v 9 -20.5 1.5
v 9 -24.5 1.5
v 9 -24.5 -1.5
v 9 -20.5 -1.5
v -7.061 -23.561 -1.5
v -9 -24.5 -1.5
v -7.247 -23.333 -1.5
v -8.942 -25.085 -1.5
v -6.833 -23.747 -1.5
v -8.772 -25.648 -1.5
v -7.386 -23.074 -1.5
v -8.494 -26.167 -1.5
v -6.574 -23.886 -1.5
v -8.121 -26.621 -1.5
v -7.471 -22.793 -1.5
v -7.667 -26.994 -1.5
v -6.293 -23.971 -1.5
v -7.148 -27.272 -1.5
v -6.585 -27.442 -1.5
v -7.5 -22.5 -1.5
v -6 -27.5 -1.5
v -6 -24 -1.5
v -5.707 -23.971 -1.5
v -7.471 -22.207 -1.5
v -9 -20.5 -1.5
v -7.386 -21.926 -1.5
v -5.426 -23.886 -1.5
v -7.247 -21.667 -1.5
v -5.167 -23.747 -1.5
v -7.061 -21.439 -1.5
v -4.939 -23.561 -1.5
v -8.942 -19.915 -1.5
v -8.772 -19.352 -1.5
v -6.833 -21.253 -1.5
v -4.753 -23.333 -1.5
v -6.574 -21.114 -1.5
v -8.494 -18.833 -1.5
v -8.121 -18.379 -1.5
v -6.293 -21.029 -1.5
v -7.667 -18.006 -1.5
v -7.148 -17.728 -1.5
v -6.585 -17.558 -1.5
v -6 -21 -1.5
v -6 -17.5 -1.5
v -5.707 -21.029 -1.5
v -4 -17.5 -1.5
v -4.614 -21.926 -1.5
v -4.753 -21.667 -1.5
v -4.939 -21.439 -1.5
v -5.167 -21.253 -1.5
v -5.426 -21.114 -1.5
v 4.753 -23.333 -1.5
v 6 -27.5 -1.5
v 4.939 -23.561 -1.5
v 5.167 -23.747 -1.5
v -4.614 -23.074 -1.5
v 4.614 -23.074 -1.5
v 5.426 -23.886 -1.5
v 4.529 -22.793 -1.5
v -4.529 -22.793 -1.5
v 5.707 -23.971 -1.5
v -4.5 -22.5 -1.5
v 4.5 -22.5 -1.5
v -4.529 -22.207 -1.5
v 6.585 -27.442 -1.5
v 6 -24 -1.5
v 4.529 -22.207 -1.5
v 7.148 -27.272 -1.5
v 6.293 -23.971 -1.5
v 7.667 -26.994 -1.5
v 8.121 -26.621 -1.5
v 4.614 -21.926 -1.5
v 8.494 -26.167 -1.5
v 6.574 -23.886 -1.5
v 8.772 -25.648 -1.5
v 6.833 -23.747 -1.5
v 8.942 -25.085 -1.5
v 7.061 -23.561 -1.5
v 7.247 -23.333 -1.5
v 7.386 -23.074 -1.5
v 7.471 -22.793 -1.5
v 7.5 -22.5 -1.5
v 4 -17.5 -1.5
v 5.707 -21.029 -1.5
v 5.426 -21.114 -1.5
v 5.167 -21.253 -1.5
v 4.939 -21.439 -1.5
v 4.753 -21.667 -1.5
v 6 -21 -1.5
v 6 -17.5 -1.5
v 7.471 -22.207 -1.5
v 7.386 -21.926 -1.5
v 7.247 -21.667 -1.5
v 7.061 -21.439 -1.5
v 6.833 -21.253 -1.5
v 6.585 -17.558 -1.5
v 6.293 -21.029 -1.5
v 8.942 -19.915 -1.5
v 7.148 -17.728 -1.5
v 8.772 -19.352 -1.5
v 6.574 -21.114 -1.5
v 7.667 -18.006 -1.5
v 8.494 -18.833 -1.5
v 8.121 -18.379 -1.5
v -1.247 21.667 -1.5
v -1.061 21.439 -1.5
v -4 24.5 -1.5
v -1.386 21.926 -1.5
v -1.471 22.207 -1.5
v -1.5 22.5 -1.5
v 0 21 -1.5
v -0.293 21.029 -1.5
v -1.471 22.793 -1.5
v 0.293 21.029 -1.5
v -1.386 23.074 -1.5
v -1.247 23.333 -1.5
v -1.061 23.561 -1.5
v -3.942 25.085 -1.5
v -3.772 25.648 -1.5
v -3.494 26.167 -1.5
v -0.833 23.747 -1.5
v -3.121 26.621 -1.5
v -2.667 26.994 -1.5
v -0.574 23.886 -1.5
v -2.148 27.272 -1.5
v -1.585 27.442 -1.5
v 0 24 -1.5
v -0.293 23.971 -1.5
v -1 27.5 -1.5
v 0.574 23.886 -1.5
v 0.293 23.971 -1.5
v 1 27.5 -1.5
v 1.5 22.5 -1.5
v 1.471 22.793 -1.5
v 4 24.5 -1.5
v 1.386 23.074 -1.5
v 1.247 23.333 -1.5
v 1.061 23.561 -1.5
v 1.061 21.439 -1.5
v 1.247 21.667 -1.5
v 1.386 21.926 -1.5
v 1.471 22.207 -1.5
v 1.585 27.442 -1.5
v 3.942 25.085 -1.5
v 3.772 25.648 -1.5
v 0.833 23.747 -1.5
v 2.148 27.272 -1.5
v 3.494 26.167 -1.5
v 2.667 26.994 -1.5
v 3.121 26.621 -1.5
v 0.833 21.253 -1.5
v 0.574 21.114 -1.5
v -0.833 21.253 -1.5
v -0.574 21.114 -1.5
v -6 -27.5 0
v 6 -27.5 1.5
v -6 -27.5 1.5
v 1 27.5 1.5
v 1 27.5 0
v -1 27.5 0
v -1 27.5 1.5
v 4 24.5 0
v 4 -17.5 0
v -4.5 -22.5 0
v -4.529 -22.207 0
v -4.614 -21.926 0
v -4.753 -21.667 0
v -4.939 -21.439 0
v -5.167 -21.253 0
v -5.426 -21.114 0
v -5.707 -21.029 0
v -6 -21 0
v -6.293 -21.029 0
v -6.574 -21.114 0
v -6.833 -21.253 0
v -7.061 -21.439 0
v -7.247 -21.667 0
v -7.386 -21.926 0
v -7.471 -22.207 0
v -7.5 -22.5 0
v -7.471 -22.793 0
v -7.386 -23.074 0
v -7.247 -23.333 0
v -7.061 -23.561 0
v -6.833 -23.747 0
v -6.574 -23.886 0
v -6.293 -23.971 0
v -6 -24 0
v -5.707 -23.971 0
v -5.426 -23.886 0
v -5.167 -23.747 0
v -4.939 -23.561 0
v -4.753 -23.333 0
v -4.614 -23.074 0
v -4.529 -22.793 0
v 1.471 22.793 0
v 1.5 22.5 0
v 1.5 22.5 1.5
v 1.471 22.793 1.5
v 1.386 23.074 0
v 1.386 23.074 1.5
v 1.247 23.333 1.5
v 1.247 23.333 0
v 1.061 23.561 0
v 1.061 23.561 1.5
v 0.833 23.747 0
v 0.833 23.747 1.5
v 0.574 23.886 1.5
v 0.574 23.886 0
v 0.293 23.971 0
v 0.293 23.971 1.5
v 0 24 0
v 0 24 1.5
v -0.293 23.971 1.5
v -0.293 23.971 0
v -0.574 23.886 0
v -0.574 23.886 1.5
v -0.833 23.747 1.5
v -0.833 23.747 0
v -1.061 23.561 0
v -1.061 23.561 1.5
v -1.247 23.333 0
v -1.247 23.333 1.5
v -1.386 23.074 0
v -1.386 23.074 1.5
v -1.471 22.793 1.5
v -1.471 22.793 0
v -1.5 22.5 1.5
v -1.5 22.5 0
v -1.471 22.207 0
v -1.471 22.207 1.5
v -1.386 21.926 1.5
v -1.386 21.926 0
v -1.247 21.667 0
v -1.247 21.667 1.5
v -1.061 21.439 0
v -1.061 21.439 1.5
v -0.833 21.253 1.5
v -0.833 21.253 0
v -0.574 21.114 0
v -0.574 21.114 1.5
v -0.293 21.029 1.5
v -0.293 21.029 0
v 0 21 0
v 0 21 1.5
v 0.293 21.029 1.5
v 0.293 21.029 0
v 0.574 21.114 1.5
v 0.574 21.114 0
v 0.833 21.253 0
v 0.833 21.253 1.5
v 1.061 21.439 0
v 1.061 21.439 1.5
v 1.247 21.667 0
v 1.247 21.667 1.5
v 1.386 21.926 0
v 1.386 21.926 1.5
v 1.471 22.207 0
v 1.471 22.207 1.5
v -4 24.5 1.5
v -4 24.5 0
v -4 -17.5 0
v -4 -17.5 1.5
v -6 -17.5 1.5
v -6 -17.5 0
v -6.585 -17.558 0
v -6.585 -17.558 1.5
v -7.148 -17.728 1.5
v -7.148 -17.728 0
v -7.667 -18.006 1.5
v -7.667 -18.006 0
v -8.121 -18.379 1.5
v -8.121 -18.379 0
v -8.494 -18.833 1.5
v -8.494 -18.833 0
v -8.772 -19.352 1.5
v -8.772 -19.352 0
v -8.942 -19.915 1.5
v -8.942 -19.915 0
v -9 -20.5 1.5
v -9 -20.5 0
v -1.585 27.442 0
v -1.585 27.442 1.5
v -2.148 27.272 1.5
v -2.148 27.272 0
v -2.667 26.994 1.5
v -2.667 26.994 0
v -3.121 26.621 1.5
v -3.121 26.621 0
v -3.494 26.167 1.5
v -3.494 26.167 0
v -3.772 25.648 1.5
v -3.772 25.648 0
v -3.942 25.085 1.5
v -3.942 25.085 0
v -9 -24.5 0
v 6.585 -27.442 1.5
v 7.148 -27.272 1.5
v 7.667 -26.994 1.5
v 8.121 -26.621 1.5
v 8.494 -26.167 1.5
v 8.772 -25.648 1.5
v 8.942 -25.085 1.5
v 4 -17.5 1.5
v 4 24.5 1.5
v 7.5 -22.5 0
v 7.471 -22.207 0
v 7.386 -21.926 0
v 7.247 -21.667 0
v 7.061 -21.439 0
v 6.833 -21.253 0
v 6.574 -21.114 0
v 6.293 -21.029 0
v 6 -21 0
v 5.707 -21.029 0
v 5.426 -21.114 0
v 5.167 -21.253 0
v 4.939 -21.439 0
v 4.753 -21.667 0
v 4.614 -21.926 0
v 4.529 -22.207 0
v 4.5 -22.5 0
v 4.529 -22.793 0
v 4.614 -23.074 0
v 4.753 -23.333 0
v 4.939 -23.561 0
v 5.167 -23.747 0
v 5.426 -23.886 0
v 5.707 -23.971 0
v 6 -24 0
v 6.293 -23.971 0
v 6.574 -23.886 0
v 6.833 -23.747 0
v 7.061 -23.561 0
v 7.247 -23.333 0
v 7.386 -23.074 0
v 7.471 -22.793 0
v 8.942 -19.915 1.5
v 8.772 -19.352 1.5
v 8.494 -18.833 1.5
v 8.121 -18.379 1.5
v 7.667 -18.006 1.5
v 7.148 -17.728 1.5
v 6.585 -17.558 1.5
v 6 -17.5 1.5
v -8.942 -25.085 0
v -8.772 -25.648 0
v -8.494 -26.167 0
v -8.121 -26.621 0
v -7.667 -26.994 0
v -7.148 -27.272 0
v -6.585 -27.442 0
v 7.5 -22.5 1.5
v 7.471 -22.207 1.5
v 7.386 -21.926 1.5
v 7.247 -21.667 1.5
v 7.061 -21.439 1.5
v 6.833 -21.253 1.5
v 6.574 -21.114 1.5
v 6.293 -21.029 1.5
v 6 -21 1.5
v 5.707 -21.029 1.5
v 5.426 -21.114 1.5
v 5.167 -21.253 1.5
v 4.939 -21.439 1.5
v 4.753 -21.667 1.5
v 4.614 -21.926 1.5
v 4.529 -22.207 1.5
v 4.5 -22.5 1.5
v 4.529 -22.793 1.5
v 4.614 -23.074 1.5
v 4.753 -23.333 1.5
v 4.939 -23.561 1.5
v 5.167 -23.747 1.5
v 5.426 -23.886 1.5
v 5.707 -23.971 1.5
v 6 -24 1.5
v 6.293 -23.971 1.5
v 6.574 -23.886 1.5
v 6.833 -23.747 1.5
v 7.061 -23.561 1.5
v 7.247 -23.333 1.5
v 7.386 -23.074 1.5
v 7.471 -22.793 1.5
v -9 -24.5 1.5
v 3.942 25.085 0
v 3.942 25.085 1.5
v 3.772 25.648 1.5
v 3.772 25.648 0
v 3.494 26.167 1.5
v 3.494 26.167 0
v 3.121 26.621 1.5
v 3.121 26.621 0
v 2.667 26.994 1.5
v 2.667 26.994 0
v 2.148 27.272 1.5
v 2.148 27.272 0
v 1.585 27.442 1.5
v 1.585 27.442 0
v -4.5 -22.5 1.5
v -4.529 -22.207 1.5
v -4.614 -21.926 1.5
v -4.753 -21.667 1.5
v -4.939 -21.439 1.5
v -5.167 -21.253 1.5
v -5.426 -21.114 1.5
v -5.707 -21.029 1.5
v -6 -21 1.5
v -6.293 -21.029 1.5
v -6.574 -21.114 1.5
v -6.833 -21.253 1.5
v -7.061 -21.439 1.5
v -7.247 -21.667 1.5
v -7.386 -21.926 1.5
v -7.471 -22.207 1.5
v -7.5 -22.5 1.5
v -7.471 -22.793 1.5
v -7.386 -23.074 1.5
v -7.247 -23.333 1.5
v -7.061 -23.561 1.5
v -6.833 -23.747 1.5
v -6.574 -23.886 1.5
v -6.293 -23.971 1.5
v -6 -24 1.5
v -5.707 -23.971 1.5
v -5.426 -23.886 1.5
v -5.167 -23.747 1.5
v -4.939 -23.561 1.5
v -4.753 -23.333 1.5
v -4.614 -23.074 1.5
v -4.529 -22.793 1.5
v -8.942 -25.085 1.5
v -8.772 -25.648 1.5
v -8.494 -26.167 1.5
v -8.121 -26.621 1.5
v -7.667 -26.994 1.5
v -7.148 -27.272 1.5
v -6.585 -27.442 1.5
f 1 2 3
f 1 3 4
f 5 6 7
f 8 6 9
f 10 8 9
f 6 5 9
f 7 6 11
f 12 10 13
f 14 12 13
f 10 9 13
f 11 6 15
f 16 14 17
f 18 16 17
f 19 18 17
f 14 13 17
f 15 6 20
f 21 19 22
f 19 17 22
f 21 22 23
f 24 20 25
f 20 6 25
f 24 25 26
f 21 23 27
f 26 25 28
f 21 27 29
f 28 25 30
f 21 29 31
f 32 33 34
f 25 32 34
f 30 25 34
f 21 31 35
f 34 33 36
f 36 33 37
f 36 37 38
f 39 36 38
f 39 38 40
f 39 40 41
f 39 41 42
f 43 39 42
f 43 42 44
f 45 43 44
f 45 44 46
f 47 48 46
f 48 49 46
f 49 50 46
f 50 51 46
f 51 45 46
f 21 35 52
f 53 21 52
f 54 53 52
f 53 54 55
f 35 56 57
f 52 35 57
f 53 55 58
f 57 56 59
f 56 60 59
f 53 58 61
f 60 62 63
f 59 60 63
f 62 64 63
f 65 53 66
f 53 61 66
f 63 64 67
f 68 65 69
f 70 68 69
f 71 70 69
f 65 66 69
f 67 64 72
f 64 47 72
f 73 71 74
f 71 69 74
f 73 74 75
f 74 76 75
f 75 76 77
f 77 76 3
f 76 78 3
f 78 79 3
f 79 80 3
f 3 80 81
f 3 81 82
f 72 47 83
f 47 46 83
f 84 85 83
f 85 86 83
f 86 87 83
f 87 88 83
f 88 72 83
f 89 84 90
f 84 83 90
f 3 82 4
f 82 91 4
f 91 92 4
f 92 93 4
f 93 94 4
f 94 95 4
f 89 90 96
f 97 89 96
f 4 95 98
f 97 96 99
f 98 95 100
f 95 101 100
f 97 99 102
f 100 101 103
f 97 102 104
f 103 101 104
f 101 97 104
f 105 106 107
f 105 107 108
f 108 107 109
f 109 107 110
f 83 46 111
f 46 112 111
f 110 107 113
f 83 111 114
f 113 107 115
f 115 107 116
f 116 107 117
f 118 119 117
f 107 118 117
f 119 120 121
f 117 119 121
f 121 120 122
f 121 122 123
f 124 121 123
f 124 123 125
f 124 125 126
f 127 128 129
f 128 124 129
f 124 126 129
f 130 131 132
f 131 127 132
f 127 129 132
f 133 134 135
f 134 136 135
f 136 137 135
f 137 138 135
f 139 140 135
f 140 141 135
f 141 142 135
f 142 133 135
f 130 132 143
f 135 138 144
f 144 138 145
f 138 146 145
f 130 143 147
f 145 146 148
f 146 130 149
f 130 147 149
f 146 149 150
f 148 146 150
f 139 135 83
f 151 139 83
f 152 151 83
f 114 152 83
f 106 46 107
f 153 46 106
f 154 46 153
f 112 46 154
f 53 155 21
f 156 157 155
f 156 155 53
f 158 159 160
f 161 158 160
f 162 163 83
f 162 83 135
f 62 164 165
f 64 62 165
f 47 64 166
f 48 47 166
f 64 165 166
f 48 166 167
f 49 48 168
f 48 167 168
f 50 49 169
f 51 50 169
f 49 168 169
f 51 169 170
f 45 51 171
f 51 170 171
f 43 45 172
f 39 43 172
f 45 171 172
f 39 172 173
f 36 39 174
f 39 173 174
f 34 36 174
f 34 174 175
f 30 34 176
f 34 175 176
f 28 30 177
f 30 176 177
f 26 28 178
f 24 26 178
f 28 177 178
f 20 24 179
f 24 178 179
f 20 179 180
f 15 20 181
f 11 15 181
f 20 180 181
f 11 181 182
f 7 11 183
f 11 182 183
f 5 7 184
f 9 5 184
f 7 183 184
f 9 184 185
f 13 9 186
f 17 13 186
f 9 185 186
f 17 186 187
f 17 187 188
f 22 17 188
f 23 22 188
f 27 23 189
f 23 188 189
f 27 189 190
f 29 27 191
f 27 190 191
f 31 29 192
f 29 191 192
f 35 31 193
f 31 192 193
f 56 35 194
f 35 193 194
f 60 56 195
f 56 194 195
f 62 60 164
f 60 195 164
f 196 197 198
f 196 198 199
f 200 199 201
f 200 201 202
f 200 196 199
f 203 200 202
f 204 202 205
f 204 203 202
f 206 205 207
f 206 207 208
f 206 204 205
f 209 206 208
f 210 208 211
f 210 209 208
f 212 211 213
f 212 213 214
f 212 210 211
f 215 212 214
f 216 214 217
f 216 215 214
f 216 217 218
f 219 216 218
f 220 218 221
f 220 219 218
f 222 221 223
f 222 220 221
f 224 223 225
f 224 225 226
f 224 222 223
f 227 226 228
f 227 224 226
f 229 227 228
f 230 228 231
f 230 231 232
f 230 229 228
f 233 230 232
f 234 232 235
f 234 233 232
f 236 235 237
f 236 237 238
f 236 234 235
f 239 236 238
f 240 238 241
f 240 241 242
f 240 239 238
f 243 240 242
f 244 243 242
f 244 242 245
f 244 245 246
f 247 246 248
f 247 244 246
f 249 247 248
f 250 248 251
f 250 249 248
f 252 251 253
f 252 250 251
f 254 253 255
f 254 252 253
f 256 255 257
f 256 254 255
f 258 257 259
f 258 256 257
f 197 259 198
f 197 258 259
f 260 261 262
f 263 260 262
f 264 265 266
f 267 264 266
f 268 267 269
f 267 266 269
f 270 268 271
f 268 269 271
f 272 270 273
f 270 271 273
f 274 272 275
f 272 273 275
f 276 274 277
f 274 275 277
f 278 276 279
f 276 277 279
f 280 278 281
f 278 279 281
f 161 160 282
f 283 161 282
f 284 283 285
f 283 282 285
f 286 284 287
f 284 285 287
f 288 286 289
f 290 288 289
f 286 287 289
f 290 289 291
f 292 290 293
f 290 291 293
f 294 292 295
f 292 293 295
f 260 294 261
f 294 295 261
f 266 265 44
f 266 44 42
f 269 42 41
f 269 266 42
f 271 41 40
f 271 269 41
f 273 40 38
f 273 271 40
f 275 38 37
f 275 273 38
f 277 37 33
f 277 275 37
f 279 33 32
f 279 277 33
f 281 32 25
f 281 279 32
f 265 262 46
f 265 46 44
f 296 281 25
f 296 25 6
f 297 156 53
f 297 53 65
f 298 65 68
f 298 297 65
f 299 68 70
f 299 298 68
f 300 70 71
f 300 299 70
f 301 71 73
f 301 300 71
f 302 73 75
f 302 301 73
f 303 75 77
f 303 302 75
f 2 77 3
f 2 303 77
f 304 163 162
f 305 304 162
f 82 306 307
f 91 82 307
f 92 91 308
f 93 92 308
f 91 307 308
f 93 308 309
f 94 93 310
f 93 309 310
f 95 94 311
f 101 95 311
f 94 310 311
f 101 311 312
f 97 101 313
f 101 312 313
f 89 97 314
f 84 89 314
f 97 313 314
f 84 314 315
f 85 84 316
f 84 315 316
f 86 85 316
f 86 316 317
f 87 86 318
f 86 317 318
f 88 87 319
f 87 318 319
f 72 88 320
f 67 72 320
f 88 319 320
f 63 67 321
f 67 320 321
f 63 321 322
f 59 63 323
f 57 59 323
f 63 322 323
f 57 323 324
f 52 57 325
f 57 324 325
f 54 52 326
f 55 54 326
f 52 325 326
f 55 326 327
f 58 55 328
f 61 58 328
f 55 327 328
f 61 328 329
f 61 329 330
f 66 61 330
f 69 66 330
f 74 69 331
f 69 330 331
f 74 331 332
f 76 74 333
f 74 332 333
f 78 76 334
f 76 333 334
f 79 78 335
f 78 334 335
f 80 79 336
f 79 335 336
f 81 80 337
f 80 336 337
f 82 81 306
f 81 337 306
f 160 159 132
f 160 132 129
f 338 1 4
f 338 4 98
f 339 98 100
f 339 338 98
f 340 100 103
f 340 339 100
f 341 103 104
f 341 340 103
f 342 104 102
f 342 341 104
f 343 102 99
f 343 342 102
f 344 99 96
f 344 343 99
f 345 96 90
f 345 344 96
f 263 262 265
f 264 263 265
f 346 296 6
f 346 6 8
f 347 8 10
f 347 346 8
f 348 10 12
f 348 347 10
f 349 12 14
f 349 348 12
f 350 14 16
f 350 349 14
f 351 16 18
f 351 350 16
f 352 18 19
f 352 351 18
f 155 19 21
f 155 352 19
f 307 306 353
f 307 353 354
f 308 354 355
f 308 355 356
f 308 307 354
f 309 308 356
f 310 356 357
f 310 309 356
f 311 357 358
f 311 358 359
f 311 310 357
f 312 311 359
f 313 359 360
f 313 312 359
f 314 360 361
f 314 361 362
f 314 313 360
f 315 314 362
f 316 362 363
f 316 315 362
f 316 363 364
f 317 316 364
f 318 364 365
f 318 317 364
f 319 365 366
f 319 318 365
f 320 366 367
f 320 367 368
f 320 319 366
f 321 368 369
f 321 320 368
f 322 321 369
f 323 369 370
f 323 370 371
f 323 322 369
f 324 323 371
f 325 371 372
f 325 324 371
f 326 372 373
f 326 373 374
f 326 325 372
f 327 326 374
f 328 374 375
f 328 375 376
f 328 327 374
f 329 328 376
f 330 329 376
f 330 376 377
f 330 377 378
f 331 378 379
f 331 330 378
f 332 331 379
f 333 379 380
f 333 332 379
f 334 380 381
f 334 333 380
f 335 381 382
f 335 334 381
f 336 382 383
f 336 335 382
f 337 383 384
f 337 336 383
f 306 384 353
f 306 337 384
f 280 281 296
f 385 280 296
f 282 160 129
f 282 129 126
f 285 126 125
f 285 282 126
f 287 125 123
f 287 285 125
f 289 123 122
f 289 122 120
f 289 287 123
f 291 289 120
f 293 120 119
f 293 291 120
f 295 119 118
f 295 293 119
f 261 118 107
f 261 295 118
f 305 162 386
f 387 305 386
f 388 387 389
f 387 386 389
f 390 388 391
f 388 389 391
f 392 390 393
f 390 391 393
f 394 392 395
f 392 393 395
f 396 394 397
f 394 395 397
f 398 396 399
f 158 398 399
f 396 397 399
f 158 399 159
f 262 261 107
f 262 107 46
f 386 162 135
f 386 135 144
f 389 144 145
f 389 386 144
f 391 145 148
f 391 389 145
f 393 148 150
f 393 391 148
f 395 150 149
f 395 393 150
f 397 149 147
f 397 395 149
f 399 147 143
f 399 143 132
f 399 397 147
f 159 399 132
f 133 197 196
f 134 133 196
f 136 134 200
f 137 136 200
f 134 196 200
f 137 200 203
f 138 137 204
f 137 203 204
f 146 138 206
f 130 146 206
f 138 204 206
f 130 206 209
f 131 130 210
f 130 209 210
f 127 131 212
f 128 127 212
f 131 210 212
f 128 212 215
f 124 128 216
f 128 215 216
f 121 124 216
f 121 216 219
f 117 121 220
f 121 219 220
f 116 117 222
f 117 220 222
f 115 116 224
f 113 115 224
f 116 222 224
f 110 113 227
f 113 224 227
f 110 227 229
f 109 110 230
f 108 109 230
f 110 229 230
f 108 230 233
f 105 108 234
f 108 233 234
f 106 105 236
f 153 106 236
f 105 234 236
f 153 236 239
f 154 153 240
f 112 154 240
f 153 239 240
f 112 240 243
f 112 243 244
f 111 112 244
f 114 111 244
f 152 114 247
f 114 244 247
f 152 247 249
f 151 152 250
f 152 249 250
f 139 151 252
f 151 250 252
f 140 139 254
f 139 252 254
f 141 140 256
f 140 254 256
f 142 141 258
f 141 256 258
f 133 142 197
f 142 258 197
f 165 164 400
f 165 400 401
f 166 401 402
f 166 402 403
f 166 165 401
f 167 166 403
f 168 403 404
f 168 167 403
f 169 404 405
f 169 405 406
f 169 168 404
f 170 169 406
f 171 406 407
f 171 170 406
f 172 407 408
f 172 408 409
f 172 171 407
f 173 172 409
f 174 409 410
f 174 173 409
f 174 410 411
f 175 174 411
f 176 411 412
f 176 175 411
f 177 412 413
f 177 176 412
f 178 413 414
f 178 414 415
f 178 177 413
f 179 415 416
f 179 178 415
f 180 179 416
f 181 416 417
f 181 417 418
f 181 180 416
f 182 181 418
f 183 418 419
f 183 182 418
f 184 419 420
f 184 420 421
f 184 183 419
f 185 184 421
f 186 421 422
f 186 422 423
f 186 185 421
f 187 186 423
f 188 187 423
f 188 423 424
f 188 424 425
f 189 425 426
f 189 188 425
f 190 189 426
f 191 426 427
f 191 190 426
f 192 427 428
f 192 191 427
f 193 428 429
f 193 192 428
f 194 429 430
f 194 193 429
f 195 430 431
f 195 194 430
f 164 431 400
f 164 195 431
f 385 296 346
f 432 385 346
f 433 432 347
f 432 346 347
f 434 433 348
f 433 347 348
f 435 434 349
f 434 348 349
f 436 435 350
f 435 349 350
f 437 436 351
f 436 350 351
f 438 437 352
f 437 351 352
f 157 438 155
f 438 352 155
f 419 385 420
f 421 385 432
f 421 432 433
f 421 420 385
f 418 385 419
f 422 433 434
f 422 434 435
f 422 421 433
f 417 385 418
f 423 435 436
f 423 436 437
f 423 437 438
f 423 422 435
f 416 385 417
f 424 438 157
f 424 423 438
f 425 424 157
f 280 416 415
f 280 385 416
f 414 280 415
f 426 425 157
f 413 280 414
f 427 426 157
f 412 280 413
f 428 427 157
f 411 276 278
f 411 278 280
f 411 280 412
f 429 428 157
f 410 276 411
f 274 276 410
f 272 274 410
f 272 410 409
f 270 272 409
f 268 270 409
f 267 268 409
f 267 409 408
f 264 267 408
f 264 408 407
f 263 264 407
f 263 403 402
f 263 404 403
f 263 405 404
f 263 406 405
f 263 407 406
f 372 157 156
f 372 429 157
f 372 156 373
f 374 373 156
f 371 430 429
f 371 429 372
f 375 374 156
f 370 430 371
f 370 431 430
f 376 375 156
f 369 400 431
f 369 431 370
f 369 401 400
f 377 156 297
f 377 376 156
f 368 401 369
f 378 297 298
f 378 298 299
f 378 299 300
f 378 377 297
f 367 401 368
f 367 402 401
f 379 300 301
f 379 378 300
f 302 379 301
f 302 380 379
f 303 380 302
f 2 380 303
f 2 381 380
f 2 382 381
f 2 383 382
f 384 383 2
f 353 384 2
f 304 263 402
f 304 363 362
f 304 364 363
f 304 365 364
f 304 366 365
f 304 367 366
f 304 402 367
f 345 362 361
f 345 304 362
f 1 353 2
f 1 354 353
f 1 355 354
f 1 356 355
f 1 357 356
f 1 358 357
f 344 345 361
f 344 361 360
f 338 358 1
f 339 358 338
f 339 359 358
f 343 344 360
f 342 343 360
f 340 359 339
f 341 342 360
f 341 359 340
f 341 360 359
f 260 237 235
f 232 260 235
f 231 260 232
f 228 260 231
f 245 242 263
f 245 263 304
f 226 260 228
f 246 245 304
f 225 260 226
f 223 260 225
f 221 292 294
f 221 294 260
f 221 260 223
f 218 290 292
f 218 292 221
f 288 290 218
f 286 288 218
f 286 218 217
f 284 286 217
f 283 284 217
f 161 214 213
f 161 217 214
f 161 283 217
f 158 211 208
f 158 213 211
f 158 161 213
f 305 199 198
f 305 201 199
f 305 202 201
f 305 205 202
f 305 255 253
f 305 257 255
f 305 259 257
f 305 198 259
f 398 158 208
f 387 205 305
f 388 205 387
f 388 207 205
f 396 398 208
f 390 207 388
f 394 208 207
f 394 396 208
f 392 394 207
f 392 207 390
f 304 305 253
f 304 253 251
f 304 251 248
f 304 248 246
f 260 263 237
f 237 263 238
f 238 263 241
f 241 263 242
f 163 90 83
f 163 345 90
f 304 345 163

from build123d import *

# Parameters (mm, degrees)
CROQUIS1_R              = 1.5
SALIENTE_EXTRUIR1_DEPTH = 1.5


with BuildPart() as part:
    # Croquis1 → Saliente-Extruir1 (new, symmetric)
    # profile 1 of 4: a face of its own
    with BuildSketch(Plane.XY):
        with BuildLine():
            Line((-4, 24.5), (-4, -17.5))
            Line((-4, -17.5), (4, -17.5))
            Line((4, -17.5), (4, 24.5))
            ThreePointArc((4, 24.5), (3.121320344, 26.621320344), (1, 27.5))
            Line((1, 27.5), (-1, 27.5))
            ThreePointArc((-1, 27.5), (-3.121320344, 26.621320344), (-4, 24.5))
        make_face()
        with Locations((0, 22.5)):
            Circle(CROQUIS1_R, mode=Mode.SUBTRACT)
    # profile 2 of 4: a face of its own
    with BuildSketch(Plane.XY):
        with BuildLine():
            Line((-6, -27.5), (-1, -27.5))
            ThreePointArc((-1, -27.5), (-3.121320344, -26.621320344), (-4, -24.5))
            Line((-4, -24.5), (-4, -17.5))
            Line((-4, -17.5), (-6, -17.5))
            ThreePointArc((-6, -17.5), (-8.121320344, -18.378679656), (-9, -20.5))
            Line((-9, -20.5), (-9, -24.5))
            ThreePointArc((-9, -24.5), (-8.121320344, -26.621320344), (-6, -27.5))
        make_face()
        with Locations((-6, -22.5)):
            Circle(CROQUIS1_R, mode=Mode.SUBTRACT)
    # profile 3 of 4: a face of its own
    with BuildSketch(Plane.XY):
        with BuildLine():
            ThreePointArc((-4, -24.5), (-3.121320344, -26.621320344), (-1, -27.5))
            Line((-1, -27.5), (1, -27.5))
            ThreePointArc((1, -27.5), (3.121320344, -26.621320344), (4, -24.5))
            Line((4, -24.5), (4, -17.5))
            Line((4, -17.5), (-4, -17.5))
            Line((-4, -17.5), (-4, -24.5))
        make_face()
    # profile 4 of 4: a face of its own
    with BuildSketch(Plane.XY):
        with BuildLine():
            ThreePointArc((4, -24.5), (3.121320344, -26.621320344), (1, -27.5))
            Line((1, -27.5), (6, -27.5))
            ThreePointArc((6, -27.5), (8.121320344, -26.621320344), (9, -24.5))
            Line((9, -24.5), (9, -20.5))
            ThreePointArc((9, -20.5), (8.121320344, -18.378679656), (6, -17.5))
            Line((6, -17.5), (4, -17.5))
            Line((4, -17.5), (4, -24.5))
        make_face()
        with Locations((6, -22.5)):
            Circle(CROQUIS1_R, mode=Mode.SUBTRACT)
    extrude(amount=SALIENTE_EXTRUIR1_DEPTH, both=True)


solid = part.part
